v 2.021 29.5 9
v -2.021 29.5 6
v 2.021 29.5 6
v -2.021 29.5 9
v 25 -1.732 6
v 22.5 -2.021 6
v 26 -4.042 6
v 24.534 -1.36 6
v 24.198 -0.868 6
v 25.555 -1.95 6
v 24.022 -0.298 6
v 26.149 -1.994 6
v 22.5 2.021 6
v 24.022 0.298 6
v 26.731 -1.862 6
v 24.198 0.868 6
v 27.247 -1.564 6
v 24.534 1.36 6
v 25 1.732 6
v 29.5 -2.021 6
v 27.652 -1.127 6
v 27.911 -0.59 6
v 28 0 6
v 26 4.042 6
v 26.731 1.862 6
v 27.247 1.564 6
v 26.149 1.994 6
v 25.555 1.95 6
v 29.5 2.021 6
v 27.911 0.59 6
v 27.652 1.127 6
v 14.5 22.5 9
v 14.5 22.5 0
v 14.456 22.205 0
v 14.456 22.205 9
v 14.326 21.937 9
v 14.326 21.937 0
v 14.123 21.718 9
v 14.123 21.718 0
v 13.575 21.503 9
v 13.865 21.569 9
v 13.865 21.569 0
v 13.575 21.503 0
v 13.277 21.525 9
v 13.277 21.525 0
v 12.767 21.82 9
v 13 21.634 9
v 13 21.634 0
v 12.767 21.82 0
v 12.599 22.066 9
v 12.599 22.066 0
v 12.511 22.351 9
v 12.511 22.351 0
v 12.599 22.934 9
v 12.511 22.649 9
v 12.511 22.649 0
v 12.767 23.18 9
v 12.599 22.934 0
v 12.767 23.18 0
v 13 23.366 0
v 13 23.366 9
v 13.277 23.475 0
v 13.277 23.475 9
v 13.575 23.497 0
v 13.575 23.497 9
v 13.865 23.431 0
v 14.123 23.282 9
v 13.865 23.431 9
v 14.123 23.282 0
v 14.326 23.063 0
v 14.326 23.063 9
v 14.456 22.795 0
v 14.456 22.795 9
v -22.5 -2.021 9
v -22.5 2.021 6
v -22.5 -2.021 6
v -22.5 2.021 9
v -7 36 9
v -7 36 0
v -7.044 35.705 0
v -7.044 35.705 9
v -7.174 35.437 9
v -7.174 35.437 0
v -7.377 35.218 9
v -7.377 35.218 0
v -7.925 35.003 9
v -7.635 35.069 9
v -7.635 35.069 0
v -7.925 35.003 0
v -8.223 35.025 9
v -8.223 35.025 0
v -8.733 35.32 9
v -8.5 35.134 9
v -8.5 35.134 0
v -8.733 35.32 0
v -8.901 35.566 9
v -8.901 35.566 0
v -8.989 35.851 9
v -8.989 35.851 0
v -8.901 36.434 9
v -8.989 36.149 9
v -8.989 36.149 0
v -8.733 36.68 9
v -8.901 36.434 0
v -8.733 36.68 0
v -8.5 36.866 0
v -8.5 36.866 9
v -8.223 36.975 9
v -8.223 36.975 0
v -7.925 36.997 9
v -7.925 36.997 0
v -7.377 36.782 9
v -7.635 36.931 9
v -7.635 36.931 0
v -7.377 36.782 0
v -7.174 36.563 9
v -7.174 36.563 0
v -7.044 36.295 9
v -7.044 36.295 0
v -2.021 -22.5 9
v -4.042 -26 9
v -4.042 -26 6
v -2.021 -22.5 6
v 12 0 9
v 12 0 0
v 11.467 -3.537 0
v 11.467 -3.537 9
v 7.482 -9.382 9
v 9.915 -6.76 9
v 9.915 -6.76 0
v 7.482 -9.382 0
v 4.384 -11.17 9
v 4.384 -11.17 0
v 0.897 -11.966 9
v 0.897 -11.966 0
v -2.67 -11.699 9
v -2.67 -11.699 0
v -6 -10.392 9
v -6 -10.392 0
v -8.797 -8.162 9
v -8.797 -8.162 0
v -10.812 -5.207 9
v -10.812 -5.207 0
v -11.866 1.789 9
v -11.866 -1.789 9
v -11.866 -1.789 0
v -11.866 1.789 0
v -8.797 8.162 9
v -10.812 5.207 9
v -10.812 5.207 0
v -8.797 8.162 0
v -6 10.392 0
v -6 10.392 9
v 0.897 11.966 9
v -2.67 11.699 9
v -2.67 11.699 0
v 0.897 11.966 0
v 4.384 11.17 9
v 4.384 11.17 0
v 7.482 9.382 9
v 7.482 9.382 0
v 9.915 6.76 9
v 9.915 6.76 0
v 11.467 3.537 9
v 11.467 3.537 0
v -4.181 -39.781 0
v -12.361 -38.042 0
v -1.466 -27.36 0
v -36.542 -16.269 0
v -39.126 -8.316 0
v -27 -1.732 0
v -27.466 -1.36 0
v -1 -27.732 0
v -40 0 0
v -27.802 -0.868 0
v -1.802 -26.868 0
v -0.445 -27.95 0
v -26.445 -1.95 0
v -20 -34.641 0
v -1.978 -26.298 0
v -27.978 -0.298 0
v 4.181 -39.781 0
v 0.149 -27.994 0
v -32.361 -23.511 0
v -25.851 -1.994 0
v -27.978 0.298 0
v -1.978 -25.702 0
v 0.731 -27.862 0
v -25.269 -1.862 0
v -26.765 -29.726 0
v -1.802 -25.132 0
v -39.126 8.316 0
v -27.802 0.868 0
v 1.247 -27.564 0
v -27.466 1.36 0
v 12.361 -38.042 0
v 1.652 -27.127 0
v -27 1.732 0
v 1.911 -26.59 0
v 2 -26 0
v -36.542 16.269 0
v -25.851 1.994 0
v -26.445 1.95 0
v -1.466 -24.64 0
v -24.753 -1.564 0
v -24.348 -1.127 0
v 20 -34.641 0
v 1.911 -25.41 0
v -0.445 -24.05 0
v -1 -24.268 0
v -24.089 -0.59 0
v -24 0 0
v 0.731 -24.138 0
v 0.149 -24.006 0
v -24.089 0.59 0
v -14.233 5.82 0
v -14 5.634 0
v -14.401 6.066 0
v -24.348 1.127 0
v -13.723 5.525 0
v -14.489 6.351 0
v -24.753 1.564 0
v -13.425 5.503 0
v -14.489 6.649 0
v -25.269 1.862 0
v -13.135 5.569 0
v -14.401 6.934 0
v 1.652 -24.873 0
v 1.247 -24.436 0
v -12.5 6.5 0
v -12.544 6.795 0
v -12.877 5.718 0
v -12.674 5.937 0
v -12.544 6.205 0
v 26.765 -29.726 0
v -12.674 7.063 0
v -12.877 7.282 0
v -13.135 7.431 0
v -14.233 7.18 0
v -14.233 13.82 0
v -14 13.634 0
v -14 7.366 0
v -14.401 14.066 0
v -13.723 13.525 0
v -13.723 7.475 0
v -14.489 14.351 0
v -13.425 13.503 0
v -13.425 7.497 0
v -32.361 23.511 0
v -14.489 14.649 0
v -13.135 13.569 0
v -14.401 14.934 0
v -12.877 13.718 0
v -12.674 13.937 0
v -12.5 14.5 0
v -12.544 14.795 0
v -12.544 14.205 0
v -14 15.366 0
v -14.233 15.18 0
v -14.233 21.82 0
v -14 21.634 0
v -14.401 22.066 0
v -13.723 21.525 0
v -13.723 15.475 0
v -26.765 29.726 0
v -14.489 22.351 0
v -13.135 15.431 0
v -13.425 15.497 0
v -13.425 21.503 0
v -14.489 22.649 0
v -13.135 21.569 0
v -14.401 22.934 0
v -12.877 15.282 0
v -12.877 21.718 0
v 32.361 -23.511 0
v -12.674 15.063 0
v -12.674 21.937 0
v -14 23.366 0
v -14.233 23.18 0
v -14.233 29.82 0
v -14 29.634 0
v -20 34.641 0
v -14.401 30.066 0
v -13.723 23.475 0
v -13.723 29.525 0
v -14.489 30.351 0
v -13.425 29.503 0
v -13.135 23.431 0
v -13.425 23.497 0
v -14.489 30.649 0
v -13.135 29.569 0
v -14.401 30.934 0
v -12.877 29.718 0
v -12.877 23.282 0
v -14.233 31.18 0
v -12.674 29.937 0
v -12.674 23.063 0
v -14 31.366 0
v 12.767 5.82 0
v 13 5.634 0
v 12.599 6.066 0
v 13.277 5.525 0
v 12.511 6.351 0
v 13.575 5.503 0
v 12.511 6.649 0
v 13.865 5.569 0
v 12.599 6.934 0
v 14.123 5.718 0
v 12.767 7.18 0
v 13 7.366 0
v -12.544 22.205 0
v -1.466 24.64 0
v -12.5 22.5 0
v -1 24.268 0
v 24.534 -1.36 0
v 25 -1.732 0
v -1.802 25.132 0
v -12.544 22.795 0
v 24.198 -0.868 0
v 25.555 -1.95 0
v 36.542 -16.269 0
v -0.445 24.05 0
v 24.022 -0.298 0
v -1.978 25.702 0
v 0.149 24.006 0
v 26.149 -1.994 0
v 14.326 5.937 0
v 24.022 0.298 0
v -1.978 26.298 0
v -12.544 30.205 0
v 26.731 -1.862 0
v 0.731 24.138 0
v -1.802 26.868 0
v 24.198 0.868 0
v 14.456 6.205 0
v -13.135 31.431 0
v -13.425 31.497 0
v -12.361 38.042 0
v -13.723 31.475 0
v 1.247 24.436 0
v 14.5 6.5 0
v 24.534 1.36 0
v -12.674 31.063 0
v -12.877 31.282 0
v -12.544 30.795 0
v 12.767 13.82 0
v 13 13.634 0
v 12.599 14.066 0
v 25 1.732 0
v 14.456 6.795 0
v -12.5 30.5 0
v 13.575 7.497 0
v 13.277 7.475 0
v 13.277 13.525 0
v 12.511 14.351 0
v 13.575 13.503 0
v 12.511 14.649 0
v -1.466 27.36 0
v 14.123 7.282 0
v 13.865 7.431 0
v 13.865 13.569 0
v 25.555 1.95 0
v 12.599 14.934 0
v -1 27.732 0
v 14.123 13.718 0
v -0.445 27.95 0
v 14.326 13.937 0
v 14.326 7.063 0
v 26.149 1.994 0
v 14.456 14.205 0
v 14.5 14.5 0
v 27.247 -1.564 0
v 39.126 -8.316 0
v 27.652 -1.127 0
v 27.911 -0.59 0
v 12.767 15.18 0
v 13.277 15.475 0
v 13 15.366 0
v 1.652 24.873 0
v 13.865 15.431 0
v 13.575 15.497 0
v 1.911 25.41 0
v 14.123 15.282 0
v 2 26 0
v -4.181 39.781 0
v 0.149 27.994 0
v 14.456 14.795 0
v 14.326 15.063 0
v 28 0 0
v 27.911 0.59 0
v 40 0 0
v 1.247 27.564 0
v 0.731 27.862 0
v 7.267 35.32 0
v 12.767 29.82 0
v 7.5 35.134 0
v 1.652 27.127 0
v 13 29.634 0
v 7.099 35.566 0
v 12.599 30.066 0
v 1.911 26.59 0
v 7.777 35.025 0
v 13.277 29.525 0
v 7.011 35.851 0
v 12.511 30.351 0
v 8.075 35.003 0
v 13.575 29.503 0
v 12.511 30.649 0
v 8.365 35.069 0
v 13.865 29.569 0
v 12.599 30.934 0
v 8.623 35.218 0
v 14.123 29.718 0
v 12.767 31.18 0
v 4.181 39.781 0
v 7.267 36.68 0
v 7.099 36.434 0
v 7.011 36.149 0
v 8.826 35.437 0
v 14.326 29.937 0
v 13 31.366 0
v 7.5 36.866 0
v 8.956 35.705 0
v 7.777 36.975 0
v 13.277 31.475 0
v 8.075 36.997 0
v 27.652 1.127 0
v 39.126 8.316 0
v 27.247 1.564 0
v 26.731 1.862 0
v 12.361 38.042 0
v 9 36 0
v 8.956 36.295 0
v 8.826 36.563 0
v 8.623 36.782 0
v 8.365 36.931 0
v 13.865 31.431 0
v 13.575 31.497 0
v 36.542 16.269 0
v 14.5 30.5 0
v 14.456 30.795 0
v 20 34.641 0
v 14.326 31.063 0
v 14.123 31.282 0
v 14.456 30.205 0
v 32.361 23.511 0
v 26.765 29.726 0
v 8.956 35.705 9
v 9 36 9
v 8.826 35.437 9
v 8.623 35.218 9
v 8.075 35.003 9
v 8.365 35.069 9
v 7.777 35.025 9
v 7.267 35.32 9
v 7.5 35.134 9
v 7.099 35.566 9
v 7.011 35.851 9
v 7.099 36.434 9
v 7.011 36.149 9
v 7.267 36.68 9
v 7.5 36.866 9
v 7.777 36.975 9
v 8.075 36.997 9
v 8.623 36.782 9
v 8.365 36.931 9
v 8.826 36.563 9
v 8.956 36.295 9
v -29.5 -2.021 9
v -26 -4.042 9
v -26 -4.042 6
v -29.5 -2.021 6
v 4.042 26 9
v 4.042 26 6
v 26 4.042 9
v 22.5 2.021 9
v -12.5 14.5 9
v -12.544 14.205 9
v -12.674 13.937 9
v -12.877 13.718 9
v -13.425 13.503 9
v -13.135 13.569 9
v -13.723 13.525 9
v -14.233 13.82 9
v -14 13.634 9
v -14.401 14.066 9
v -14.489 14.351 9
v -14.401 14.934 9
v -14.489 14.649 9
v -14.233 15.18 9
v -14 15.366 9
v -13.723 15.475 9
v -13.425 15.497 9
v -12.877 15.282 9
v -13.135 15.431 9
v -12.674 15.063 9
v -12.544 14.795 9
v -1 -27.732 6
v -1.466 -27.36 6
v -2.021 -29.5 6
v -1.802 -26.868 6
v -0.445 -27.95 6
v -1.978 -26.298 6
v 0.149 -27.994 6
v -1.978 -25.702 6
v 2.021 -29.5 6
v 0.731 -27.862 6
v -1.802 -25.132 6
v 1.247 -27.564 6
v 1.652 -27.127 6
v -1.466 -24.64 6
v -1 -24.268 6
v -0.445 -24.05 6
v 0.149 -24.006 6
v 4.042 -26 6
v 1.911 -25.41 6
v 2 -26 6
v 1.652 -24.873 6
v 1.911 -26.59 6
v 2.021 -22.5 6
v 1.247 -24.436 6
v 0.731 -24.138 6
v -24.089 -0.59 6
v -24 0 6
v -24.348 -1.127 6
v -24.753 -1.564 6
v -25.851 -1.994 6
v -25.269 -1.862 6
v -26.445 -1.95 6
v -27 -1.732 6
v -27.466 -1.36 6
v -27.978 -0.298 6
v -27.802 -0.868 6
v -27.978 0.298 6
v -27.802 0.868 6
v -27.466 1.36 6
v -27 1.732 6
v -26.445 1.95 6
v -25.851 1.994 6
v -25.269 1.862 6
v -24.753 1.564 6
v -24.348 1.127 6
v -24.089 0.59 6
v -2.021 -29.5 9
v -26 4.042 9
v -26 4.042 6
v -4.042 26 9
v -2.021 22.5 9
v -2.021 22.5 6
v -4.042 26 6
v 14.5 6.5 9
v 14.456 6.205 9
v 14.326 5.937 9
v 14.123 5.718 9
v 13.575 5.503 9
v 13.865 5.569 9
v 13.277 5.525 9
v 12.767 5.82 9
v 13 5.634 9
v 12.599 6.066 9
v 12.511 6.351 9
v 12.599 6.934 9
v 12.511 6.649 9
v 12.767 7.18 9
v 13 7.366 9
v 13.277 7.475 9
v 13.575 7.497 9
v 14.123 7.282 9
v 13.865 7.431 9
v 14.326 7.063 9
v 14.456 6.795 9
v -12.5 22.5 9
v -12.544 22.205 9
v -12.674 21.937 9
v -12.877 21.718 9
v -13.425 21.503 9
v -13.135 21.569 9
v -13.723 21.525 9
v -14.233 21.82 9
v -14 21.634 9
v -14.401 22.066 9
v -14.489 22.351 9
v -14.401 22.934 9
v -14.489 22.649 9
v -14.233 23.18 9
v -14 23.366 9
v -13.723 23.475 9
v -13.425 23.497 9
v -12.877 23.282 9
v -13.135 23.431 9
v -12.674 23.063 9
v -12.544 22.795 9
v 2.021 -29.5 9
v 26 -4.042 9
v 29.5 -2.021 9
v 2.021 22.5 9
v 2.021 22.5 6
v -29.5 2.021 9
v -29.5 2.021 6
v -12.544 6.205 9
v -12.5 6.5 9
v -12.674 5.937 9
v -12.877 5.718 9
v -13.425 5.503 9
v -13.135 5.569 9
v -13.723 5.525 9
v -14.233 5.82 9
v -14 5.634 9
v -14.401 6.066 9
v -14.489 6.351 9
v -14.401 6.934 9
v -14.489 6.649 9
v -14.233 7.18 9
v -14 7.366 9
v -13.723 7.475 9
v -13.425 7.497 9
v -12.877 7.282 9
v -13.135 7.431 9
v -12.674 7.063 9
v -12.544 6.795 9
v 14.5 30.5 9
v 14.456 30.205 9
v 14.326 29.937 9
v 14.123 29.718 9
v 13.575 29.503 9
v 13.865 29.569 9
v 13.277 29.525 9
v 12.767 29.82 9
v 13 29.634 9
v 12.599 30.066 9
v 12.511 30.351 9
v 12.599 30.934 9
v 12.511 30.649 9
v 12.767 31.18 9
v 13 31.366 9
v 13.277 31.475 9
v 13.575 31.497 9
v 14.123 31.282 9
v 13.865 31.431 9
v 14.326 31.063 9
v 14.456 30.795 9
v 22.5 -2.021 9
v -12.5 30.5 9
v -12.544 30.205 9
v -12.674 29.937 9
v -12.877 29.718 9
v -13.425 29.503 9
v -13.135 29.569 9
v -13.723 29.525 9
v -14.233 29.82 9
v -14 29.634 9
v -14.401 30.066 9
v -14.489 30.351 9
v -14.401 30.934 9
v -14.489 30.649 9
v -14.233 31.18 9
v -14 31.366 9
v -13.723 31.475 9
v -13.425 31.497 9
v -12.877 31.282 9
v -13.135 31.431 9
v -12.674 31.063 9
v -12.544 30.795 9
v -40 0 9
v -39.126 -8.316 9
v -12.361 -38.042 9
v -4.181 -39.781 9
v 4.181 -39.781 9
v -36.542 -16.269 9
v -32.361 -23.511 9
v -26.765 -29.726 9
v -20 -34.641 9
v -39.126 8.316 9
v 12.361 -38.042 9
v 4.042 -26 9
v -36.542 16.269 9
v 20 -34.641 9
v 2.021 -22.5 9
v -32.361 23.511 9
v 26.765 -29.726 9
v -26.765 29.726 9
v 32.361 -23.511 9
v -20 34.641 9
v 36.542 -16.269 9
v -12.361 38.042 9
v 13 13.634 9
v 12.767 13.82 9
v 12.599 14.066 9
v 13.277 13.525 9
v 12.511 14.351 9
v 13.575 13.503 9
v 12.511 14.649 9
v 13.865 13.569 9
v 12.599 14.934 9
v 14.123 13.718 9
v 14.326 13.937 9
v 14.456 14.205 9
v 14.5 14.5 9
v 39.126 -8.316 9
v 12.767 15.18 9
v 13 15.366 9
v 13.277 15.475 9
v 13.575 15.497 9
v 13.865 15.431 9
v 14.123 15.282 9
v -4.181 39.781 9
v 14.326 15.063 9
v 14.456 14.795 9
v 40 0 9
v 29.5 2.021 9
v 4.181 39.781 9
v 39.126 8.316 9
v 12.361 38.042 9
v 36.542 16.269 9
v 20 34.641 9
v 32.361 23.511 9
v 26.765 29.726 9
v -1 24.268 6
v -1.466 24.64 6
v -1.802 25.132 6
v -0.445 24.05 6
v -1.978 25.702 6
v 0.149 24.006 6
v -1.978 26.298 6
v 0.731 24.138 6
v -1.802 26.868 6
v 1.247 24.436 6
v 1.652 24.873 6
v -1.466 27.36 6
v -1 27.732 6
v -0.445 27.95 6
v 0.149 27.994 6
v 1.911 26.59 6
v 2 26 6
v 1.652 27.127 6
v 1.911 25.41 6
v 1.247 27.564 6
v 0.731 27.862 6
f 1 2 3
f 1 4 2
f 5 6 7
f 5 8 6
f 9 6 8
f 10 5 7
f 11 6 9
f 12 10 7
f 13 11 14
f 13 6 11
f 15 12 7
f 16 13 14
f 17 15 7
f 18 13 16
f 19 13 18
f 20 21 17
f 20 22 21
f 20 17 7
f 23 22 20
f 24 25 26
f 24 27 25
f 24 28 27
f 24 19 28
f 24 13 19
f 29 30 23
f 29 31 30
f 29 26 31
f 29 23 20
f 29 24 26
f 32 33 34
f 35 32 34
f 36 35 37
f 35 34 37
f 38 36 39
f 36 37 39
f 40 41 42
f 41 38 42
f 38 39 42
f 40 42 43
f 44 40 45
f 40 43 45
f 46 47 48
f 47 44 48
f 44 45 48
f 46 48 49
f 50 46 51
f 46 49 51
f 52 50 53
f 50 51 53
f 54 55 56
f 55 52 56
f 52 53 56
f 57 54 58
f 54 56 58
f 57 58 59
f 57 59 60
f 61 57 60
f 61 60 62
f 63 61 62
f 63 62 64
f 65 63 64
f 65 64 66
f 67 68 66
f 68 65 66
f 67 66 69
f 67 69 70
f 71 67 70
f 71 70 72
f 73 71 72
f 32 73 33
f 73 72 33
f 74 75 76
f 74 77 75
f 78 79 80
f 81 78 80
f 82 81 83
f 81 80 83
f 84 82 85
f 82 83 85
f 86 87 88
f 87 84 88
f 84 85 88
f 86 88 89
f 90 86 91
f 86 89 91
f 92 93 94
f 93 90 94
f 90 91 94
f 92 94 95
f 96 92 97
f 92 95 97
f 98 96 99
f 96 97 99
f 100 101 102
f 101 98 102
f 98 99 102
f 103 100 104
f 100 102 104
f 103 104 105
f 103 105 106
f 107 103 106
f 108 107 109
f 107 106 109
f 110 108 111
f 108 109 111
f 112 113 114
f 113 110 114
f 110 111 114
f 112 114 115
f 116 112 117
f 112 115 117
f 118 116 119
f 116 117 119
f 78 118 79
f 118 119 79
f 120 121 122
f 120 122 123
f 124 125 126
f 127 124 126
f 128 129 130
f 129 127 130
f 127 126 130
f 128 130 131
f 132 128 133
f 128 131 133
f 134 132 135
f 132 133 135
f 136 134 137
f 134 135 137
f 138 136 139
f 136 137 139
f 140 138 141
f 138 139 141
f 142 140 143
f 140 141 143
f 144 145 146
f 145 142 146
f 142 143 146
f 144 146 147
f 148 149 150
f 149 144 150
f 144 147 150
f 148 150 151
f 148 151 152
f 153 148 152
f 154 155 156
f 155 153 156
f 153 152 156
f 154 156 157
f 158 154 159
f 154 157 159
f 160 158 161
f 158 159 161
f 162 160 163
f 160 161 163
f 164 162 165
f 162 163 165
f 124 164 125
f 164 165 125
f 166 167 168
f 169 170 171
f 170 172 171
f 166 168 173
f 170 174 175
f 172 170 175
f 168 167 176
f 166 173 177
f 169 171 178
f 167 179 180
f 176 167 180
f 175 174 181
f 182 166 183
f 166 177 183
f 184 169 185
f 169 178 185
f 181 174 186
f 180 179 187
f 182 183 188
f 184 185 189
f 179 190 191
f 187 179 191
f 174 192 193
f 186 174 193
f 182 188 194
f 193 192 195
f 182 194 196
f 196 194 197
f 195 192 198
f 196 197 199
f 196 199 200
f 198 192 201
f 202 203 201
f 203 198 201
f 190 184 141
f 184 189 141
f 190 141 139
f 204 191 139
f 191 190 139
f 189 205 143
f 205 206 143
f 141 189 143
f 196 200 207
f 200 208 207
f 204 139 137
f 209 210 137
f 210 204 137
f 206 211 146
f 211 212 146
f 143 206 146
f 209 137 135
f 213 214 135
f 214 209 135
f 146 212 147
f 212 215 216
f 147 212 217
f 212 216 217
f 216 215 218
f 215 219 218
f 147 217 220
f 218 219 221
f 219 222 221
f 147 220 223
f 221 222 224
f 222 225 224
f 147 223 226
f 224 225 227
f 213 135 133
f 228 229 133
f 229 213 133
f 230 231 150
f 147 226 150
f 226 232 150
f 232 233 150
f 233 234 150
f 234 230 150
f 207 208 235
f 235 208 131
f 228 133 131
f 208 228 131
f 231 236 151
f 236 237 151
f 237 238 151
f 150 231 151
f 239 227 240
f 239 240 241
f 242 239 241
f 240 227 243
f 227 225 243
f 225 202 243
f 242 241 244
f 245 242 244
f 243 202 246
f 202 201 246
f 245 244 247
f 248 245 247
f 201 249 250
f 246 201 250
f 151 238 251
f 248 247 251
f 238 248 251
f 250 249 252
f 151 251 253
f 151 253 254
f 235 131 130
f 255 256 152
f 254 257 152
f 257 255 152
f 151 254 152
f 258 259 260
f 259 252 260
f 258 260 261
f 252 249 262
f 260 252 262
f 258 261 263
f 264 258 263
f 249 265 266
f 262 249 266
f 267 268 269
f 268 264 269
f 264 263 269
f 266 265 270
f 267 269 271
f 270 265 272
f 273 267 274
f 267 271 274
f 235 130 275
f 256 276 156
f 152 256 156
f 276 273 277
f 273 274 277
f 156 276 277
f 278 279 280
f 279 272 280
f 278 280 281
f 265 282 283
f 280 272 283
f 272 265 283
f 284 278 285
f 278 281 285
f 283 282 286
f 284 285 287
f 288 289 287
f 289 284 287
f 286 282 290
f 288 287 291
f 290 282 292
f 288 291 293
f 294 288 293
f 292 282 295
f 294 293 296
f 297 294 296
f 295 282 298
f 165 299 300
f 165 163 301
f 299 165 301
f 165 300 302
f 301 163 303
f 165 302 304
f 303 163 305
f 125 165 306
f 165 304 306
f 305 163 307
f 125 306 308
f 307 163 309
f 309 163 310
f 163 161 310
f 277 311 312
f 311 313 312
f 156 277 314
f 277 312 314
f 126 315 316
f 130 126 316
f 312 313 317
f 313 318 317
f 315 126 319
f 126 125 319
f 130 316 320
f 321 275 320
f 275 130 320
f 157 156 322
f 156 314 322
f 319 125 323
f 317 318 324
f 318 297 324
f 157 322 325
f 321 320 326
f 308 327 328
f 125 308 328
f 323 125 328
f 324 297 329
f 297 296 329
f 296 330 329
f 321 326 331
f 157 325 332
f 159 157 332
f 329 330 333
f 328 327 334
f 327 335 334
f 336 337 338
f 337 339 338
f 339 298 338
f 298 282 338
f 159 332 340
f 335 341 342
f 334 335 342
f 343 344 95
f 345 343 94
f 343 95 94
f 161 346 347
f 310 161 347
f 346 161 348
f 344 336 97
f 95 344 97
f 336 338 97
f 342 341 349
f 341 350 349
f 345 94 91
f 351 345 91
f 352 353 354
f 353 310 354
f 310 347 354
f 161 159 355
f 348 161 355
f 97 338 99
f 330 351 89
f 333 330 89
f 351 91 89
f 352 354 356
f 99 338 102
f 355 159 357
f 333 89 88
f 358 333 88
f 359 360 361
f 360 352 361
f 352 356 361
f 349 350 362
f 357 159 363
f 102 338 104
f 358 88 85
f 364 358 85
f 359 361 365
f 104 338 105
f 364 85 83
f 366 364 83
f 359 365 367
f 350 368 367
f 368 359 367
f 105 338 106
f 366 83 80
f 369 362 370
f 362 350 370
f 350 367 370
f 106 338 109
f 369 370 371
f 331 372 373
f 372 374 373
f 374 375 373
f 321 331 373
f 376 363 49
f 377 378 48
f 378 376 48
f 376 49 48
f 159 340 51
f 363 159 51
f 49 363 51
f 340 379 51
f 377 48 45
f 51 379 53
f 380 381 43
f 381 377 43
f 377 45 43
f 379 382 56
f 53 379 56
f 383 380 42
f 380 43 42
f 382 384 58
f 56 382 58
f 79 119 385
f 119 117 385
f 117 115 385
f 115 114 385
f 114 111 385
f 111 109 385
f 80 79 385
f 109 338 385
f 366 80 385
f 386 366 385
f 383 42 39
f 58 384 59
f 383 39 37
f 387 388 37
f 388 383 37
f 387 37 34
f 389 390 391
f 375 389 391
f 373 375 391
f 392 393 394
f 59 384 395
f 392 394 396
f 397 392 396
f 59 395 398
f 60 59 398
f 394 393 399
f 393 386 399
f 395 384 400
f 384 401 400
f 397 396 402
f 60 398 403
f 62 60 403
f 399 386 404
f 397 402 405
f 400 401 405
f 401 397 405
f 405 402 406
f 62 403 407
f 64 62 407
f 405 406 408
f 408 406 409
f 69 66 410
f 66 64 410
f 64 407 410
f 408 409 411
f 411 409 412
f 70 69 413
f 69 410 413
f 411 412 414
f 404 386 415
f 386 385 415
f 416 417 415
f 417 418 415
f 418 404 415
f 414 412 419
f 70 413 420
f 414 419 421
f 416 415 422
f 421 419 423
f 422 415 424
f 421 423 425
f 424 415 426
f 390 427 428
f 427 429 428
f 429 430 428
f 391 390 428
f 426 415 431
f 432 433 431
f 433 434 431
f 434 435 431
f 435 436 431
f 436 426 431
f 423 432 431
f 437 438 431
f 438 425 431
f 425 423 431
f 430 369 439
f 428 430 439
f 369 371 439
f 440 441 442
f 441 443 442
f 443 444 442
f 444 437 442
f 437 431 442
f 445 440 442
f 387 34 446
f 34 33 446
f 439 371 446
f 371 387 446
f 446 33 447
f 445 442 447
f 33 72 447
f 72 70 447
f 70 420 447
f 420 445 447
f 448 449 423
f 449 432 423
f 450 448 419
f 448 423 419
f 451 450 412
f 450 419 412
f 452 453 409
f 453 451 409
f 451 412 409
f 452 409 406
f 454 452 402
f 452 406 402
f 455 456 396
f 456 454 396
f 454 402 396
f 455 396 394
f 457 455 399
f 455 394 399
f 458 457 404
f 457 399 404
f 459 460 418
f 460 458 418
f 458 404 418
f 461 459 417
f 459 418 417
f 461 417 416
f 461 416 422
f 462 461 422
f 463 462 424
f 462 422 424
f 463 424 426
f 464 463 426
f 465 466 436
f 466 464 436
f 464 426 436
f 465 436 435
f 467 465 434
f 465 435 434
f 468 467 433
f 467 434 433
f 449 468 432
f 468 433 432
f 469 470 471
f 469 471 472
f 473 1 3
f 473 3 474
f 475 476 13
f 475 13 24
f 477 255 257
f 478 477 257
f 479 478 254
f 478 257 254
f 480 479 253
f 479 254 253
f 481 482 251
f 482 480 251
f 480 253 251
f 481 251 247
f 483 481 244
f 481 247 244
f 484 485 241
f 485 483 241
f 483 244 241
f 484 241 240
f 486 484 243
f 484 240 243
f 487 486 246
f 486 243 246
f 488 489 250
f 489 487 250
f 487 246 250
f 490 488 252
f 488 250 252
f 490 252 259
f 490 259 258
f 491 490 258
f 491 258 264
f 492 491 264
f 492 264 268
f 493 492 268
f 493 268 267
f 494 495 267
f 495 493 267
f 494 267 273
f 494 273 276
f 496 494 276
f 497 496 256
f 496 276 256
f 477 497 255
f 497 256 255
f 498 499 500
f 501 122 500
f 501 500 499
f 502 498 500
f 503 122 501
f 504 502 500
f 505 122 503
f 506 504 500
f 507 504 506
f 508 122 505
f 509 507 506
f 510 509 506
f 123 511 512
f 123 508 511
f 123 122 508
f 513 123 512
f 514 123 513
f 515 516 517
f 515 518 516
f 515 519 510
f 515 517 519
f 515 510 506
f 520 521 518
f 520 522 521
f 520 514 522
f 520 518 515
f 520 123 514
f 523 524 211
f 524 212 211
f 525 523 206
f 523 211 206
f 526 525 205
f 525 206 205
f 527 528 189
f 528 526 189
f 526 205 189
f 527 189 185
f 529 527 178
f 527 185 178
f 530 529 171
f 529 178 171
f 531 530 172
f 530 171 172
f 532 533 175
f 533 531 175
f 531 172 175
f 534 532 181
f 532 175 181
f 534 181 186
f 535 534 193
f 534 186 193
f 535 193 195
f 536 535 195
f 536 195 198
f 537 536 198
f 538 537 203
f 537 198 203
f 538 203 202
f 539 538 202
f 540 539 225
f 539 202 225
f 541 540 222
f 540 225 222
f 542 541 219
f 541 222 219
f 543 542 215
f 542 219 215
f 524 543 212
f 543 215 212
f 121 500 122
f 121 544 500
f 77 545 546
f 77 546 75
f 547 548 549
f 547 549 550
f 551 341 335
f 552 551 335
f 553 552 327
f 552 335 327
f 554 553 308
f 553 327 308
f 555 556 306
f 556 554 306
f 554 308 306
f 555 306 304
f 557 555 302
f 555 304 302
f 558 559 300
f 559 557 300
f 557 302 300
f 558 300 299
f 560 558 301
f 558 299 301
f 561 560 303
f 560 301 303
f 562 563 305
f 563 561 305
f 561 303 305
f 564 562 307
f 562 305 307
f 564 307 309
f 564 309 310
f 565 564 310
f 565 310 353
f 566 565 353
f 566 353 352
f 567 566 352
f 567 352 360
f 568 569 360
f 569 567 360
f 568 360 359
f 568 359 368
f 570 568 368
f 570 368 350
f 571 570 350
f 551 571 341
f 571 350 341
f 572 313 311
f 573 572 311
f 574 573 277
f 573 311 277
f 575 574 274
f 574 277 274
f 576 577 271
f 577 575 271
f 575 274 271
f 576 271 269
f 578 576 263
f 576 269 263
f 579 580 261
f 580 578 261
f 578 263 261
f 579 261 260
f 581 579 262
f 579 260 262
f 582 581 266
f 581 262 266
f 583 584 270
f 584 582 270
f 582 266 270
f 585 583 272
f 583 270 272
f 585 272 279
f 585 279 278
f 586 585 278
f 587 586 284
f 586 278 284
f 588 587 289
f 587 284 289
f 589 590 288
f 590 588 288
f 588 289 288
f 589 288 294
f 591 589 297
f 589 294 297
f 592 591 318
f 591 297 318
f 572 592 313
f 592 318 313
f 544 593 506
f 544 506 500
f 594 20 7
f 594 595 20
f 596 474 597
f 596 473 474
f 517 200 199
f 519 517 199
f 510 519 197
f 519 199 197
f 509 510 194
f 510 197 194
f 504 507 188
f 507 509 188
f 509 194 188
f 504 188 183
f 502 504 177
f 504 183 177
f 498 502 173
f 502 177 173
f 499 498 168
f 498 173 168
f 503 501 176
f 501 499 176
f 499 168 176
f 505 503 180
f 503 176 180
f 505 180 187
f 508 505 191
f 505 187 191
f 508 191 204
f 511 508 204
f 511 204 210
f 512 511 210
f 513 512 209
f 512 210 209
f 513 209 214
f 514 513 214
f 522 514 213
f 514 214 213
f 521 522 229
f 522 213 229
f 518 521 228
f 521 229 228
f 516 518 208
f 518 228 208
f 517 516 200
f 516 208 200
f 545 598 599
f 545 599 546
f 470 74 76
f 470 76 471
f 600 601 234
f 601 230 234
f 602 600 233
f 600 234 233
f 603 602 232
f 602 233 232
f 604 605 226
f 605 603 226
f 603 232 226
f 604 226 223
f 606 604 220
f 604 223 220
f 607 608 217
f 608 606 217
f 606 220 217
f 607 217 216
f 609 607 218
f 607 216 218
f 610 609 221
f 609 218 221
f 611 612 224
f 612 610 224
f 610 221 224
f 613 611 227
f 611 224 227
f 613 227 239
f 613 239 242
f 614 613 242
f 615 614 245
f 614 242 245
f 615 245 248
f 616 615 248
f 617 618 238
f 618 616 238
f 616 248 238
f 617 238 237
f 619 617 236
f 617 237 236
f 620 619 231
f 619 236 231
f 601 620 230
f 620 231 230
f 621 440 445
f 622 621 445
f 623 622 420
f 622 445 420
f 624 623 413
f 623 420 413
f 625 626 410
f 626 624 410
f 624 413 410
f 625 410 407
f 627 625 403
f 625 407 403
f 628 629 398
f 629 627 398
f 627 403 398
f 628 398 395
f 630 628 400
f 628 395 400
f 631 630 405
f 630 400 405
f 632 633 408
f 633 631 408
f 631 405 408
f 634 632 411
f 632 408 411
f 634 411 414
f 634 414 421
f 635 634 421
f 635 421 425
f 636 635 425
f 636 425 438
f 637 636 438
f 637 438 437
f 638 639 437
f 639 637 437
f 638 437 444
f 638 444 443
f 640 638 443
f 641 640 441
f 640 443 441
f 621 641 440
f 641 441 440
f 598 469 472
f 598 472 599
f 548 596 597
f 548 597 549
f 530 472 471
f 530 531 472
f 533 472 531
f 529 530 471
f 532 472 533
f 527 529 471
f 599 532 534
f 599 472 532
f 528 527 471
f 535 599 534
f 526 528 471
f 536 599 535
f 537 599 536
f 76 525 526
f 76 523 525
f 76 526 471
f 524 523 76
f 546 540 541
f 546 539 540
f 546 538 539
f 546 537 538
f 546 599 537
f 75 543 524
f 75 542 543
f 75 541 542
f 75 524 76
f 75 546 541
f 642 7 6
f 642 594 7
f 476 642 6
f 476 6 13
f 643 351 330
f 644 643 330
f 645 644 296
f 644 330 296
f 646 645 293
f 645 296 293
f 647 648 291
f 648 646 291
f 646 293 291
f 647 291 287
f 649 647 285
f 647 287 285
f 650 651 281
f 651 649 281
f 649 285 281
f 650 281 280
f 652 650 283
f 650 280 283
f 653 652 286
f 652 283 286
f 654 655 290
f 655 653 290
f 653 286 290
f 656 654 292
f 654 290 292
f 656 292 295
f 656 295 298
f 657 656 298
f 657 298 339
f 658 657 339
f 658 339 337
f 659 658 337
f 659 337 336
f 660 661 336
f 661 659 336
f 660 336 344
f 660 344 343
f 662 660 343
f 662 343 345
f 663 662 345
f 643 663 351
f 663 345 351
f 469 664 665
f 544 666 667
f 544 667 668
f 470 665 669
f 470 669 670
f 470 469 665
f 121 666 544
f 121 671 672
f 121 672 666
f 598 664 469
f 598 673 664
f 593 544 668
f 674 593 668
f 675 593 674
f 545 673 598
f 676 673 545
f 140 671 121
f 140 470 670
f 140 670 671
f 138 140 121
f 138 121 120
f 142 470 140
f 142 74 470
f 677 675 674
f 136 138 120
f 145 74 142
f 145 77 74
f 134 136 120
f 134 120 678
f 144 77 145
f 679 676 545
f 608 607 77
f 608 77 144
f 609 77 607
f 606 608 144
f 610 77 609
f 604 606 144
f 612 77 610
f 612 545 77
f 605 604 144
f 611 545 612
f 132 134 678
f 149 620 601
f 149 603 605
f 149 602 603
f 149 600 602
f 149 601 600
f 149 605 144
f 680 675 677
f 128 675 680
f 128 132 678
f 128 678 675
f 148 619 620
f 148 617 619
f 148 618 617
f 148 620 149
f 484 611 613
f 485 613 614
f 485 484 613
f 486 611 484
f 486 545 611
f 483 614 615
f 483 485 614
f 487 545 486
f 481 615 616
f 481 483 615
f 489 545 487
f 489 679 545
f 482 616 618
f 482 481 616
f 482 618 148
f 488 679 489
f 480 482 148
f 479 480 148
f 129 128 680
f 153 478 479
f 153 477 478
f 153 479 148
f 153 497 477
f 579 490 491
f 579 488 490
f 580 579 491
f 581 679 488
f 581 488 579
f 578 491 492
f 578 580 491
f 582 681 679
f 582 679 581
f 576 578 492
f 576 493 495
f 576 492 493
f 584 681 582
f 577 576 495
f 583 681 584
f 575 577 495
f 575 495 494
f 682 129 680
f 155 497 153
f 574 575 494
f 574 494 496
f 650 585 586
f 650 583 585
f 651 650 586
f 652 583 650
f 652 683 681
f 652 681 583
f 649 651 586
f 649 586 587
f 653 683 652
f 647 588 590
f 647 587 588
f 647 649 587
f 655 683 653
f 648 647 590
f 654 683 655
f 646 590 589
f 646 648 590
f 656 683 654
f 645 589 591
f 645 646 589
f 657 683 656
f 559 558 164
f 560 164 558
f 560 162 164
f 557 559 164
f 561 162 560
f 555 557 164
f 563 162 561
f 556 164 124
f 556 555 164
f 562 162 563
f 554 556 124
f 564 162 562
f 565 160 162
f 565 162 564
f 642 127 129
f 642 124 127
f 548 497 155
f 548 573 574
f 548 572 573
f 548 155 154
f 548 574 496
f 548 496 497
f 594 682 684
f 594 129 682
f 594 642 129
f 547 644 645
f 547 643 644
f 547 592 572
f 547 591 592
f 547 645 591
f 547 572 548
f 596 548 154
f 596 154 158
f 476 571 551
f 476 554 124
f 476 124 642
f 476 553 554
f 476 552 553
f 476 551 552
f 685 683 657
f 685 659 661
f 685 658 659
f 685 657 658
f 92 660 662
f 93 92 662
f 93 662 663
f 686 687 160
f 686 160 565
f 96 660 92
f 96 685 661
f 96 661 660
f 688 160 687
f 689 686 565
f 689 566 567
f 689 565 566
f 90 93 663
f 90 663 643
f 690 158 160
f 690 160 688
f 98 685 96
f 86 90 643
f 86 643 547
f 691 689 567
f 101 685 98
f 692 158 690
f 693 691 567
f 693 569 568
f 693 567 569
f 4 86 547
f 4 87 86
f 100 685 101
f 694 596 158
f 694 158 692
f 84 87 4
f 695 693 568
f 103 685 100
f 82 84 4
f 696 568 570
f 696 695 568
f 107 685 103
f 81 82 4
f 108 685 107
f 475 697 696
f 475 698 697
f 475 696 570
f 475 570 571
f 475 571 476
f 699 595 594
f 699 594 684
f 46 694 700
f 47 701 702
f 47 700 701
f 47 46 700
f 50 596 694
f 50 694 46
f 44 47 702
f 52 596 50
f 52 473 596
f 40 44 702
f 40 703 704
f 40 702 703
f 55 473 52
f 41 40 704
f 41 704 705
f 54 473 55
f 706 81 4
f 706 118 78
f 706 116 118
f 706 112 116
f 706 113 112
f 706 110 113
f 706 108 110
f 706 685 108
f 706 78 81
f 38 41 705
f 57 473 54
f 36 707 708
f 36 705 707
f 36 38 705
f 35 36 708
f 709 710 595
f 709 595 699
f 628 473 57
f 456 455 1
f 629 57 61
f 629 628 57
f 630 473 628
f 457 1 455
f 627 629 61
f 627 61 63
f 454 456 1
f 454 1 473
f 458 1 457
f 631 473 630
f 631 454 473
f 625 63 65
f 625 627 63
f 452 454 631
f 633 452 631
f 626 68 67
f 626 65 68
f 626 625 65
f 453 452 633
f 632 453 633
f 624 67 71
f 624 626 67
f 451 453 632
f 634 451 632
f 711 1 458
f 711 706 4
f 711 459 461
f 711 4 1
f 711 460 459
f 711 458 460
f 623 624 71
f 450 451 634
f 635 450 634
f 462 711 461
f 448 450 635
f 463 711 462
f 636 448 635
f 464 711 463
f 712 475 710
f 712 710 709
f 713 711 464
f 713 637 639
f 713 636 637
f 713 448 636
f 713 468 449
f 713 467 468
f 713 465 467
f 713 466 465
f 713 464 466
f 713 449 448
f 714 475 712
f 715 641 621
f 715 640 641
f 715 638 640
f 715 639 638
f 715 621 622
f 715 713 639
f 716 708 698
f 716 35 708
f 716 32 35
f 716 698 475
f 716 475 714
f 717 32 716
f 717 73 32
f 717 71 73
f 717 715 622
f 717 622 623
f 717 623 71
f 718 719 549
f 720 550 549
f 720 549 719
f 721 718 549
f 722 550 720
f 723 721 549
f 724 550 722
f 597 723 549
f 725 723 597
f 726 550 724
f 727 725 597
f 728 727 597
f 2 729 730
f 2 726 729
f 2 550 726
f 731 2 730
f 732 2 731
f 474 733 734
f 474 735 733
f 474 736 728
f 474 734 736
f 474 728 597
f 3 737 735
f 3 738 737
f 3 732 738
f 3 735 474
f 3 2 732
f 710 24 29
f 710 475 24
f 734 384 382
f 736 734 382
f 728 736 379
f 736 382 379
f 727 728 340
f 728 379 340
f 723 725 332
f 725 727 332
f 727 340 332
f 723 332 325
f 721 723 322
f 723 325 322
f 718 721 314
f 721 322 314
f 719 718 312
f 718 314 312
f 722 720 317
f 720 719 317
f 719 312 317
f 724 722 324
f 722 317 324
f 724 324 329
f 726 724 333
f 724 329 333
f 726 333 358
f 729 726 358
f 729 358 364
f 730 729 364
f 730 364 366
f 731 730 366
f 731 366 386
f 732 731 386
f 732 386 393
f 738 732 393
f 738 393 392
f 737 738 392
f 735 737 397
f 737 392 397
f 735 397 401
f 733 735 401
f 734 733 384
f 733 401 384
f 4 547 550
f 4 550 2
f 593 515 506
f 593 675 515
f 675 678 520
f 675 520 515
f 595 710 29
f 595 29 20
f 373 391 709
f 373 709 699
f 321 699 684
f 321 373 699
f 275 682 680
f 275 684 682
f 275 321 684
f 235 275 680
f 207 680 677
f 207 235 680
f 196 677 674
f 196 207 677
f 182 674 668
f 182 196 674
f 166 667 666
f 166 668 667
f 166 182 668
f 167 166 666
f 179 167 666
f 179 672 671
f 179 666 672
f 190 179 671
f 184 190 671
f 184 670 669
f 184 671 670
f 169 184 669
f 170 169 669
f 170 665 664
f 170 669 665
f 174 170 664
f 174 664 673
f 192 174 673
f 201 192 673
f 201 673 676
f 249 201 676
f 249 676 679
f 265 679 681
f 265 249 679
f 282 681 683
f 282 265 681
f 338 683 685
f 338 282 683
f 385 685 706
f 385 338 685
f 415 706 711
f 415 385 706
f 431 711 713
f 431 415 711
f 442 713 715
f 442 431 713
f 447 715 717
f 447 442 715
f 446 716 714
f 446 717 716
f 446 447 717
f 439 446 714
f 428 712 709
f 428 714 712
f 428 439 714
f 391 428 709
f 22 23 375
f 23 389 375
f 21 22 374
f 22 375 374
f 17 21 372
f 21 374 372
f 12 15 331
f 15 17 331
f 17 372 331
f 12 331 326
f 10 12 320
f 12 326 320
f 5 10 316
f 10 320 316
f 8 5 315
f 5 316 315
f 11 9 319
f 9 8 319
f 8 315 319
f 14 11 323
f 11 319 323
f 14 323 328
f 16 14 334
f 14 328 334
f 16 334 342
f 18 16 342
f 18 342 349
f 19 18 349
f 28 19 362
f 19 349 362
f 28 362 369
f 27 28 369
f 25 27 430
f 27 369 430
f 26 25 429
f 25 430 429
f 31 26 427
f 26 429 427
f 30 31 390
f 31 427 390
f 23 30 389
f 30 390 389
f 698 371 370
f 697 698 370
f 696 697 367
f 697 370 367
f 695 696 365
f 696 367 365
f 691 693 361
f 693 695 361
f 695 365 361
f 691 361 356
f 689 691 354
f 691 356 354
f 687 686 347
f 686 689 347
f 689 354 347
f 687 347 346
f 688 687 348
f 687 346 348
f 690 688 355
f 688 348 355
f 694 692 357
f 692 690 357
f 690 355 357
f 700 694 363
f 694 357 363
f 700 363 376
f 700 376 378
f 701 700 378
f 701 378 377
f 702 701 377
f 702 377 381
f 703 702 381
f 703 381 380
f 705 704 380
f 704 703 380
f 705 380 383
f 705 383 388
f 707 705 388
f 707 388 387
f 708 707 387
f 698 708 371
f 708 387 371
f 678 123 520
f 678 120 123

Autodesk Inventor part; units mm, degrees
ref_plane "YZ Plane" through (0, 0, 0) normal (1, 0, 0) x (0, 1, 0)
ref_plane "XZ Plane" through (0, 0, 0) normal (0, 1, 0) x (-1, 0, 0)
ref_plane "XY Plane" through (0, 0, 0) normal (0, 0, 1) x (1, 0, 0)
sketch "Esquisse1" plane through (0, 0, 0) normal (0, 0, 1) x (1, 0, 0)
  circle A0 centre (0, 0) radius 40
  circle A1 centre (0, 0) radius 12
  line L0 (0, 0) -> (-13.5, 0) construction
  line L1 (-13.5, 0) -> (-13.5, 6.5) construction
  line L2 (-13.5, 6.5) -> (-13.5, 14.5) construction
  line L3 (-13.5, 14.5) -> (-13.5, 22.5) construction
  line L4 (-13.5, 22.5) -> (-13.5, 30.5) construction
  line L5 (0, 0) -> (0, 36) construction
  line L6 (0, 36) -> (-8, 36) construction
  circle A2 centre (-13.5, 6.5) radius 1
  circle A3 centre (-13.5, 14.5) radius 1
  circle A4 centre (-13.5, 22.5) radius 1
  circle A5 centre (-13.5, 30.5) radius 1
  circle A6 centre (-8, 36) radius 1
  circle A7 centre (13.5, 6.5) radius 1
  circle A8 centre (13.5, 14.5) radius 1
  circle A9 centre (13.5, 22.5) radius 1
  circle A10 centre (13.5, 30.5) radius 1
  circle A11 centre (8, 36) radius 1
  line L7 (0, 0) -> (40, 0) construction
  line L8 (12, 0) -> (40, 0) construction
  circle A12 centre (26, 0) radius 2
  circle A13 centre (0, 26) radius 2
  circle A14 centre (-26, 0) radius 2
  circle A15 centre (0, -26) radius 2
  line L9 (0, 0) -> (0, -26) construction
  dimension "d0" = 80
  dimension "d1" = 24
  dimension "d2" = 13.5
  dimension "d3" = 6.5
  dimension "d4" = 8
  dimension "d5" = 8
  dimension "d6" = 8
  dimension "d7" = 36
  dimension "d8" = 8
  dimension "d9" = 2
  dimension "d25" = 4
  dimension "d28" = 360
  dimension "d39" = 26
extrude "Extrusion3" add sketch "Esquisse1" along normal blind 9
sketch "Esquisse5" plane through (0, 0, 9) normal (0, 0, 1) x (1, 0, 0)
  circle A0 centre (0, 0) radius 12 projected
  circle A1 centre (0, -26) radius 2 projected
  circle A2 centre (-26, 0) radius 2 projected
  circle A3 centre (0, 26) radius 2 projected
  circle A4 centre (26, 0) radius 2 projected
  circle A5 centre (0, 0) radius 40 projected
  line L0 (0, 0) -> (40, 0) construction
  line L1 (29.5, 2.0207) -> (29.5, -2.0207)
  line L2 (29.5, -2.0207) -> (26, -4.0415)
  line L3 (26, -4.0415) -> (22.5, -2.0207)
  line L4 (22.5, -2.0207) -> (22.5, 2.0207)
  line L5 (22.5, 2.0207) -> (26, 4.0415)
  line L6 (26, 4.0415) -> (29.5, 2.0207)
  line L7 (22.5, 2.0207) -> (29.5, 2.0207) construction
  line L8 (-2.0207, 29.5) -> (2.0207, 29.5)
  line L9 (2.0207, 29.5) -> (4.0415, 26)
  line L10 (4.0415, 26) -> (2.0207, 22.5)
  line L11 (2.0207, 22.5) -> (-2.0207, 22.5)
  line L12 (-2.0207, 22.5) -> (-4.0415, 26)
  line L13 (-4.0415, 26) -> (-2.0207, 29.5)
  line L14 (-29.5, -2.0207) -> (-29.5, 2.0207)
  line L15 (-29.5, 2.0207) -> (-26, 4.0415)
  line L16 (-26, 4.0415) -> (-22.5, 2.0207)
  line L17 (-22.5, 2.0207) -> (-22.5, -2.0207)
  line L18 (-22.5, -2.0207) -> (-26, -4.0415)
  line L19 (-26, -4.0415) -> (-29.5, -2.0207)
  line L20 (2.0207, -29.5) -> (-2.0207, -29.5)
  line L21 (-2.0207, -29.5) -> (-4.0415, -26)
  line L22 (-4.0415, -26) -> (-2.0207, -22.5)
  line L23 (-2.0207, -22.5) -> (2.0207, -22.5)
  line L24 (2.0207, -22.5) -> (4.0415, -26)
  line L25 (4.0415, -26) -> (2.0207, -29.5)
  dimension "d50" = 7
  dimension "d53" = 360
extrude "Extrusion7" cut sketch "Esquisse5" against normal blind 3 contours L1 L2 L3 L4 L5 L6 | L8 L9 L10 L11 L12 L13 | L14 L15 L16 L17 L18 L19 | L20 L21 L22 L23 L24 L25
properties part number "bowl_ax12_support_v2"
